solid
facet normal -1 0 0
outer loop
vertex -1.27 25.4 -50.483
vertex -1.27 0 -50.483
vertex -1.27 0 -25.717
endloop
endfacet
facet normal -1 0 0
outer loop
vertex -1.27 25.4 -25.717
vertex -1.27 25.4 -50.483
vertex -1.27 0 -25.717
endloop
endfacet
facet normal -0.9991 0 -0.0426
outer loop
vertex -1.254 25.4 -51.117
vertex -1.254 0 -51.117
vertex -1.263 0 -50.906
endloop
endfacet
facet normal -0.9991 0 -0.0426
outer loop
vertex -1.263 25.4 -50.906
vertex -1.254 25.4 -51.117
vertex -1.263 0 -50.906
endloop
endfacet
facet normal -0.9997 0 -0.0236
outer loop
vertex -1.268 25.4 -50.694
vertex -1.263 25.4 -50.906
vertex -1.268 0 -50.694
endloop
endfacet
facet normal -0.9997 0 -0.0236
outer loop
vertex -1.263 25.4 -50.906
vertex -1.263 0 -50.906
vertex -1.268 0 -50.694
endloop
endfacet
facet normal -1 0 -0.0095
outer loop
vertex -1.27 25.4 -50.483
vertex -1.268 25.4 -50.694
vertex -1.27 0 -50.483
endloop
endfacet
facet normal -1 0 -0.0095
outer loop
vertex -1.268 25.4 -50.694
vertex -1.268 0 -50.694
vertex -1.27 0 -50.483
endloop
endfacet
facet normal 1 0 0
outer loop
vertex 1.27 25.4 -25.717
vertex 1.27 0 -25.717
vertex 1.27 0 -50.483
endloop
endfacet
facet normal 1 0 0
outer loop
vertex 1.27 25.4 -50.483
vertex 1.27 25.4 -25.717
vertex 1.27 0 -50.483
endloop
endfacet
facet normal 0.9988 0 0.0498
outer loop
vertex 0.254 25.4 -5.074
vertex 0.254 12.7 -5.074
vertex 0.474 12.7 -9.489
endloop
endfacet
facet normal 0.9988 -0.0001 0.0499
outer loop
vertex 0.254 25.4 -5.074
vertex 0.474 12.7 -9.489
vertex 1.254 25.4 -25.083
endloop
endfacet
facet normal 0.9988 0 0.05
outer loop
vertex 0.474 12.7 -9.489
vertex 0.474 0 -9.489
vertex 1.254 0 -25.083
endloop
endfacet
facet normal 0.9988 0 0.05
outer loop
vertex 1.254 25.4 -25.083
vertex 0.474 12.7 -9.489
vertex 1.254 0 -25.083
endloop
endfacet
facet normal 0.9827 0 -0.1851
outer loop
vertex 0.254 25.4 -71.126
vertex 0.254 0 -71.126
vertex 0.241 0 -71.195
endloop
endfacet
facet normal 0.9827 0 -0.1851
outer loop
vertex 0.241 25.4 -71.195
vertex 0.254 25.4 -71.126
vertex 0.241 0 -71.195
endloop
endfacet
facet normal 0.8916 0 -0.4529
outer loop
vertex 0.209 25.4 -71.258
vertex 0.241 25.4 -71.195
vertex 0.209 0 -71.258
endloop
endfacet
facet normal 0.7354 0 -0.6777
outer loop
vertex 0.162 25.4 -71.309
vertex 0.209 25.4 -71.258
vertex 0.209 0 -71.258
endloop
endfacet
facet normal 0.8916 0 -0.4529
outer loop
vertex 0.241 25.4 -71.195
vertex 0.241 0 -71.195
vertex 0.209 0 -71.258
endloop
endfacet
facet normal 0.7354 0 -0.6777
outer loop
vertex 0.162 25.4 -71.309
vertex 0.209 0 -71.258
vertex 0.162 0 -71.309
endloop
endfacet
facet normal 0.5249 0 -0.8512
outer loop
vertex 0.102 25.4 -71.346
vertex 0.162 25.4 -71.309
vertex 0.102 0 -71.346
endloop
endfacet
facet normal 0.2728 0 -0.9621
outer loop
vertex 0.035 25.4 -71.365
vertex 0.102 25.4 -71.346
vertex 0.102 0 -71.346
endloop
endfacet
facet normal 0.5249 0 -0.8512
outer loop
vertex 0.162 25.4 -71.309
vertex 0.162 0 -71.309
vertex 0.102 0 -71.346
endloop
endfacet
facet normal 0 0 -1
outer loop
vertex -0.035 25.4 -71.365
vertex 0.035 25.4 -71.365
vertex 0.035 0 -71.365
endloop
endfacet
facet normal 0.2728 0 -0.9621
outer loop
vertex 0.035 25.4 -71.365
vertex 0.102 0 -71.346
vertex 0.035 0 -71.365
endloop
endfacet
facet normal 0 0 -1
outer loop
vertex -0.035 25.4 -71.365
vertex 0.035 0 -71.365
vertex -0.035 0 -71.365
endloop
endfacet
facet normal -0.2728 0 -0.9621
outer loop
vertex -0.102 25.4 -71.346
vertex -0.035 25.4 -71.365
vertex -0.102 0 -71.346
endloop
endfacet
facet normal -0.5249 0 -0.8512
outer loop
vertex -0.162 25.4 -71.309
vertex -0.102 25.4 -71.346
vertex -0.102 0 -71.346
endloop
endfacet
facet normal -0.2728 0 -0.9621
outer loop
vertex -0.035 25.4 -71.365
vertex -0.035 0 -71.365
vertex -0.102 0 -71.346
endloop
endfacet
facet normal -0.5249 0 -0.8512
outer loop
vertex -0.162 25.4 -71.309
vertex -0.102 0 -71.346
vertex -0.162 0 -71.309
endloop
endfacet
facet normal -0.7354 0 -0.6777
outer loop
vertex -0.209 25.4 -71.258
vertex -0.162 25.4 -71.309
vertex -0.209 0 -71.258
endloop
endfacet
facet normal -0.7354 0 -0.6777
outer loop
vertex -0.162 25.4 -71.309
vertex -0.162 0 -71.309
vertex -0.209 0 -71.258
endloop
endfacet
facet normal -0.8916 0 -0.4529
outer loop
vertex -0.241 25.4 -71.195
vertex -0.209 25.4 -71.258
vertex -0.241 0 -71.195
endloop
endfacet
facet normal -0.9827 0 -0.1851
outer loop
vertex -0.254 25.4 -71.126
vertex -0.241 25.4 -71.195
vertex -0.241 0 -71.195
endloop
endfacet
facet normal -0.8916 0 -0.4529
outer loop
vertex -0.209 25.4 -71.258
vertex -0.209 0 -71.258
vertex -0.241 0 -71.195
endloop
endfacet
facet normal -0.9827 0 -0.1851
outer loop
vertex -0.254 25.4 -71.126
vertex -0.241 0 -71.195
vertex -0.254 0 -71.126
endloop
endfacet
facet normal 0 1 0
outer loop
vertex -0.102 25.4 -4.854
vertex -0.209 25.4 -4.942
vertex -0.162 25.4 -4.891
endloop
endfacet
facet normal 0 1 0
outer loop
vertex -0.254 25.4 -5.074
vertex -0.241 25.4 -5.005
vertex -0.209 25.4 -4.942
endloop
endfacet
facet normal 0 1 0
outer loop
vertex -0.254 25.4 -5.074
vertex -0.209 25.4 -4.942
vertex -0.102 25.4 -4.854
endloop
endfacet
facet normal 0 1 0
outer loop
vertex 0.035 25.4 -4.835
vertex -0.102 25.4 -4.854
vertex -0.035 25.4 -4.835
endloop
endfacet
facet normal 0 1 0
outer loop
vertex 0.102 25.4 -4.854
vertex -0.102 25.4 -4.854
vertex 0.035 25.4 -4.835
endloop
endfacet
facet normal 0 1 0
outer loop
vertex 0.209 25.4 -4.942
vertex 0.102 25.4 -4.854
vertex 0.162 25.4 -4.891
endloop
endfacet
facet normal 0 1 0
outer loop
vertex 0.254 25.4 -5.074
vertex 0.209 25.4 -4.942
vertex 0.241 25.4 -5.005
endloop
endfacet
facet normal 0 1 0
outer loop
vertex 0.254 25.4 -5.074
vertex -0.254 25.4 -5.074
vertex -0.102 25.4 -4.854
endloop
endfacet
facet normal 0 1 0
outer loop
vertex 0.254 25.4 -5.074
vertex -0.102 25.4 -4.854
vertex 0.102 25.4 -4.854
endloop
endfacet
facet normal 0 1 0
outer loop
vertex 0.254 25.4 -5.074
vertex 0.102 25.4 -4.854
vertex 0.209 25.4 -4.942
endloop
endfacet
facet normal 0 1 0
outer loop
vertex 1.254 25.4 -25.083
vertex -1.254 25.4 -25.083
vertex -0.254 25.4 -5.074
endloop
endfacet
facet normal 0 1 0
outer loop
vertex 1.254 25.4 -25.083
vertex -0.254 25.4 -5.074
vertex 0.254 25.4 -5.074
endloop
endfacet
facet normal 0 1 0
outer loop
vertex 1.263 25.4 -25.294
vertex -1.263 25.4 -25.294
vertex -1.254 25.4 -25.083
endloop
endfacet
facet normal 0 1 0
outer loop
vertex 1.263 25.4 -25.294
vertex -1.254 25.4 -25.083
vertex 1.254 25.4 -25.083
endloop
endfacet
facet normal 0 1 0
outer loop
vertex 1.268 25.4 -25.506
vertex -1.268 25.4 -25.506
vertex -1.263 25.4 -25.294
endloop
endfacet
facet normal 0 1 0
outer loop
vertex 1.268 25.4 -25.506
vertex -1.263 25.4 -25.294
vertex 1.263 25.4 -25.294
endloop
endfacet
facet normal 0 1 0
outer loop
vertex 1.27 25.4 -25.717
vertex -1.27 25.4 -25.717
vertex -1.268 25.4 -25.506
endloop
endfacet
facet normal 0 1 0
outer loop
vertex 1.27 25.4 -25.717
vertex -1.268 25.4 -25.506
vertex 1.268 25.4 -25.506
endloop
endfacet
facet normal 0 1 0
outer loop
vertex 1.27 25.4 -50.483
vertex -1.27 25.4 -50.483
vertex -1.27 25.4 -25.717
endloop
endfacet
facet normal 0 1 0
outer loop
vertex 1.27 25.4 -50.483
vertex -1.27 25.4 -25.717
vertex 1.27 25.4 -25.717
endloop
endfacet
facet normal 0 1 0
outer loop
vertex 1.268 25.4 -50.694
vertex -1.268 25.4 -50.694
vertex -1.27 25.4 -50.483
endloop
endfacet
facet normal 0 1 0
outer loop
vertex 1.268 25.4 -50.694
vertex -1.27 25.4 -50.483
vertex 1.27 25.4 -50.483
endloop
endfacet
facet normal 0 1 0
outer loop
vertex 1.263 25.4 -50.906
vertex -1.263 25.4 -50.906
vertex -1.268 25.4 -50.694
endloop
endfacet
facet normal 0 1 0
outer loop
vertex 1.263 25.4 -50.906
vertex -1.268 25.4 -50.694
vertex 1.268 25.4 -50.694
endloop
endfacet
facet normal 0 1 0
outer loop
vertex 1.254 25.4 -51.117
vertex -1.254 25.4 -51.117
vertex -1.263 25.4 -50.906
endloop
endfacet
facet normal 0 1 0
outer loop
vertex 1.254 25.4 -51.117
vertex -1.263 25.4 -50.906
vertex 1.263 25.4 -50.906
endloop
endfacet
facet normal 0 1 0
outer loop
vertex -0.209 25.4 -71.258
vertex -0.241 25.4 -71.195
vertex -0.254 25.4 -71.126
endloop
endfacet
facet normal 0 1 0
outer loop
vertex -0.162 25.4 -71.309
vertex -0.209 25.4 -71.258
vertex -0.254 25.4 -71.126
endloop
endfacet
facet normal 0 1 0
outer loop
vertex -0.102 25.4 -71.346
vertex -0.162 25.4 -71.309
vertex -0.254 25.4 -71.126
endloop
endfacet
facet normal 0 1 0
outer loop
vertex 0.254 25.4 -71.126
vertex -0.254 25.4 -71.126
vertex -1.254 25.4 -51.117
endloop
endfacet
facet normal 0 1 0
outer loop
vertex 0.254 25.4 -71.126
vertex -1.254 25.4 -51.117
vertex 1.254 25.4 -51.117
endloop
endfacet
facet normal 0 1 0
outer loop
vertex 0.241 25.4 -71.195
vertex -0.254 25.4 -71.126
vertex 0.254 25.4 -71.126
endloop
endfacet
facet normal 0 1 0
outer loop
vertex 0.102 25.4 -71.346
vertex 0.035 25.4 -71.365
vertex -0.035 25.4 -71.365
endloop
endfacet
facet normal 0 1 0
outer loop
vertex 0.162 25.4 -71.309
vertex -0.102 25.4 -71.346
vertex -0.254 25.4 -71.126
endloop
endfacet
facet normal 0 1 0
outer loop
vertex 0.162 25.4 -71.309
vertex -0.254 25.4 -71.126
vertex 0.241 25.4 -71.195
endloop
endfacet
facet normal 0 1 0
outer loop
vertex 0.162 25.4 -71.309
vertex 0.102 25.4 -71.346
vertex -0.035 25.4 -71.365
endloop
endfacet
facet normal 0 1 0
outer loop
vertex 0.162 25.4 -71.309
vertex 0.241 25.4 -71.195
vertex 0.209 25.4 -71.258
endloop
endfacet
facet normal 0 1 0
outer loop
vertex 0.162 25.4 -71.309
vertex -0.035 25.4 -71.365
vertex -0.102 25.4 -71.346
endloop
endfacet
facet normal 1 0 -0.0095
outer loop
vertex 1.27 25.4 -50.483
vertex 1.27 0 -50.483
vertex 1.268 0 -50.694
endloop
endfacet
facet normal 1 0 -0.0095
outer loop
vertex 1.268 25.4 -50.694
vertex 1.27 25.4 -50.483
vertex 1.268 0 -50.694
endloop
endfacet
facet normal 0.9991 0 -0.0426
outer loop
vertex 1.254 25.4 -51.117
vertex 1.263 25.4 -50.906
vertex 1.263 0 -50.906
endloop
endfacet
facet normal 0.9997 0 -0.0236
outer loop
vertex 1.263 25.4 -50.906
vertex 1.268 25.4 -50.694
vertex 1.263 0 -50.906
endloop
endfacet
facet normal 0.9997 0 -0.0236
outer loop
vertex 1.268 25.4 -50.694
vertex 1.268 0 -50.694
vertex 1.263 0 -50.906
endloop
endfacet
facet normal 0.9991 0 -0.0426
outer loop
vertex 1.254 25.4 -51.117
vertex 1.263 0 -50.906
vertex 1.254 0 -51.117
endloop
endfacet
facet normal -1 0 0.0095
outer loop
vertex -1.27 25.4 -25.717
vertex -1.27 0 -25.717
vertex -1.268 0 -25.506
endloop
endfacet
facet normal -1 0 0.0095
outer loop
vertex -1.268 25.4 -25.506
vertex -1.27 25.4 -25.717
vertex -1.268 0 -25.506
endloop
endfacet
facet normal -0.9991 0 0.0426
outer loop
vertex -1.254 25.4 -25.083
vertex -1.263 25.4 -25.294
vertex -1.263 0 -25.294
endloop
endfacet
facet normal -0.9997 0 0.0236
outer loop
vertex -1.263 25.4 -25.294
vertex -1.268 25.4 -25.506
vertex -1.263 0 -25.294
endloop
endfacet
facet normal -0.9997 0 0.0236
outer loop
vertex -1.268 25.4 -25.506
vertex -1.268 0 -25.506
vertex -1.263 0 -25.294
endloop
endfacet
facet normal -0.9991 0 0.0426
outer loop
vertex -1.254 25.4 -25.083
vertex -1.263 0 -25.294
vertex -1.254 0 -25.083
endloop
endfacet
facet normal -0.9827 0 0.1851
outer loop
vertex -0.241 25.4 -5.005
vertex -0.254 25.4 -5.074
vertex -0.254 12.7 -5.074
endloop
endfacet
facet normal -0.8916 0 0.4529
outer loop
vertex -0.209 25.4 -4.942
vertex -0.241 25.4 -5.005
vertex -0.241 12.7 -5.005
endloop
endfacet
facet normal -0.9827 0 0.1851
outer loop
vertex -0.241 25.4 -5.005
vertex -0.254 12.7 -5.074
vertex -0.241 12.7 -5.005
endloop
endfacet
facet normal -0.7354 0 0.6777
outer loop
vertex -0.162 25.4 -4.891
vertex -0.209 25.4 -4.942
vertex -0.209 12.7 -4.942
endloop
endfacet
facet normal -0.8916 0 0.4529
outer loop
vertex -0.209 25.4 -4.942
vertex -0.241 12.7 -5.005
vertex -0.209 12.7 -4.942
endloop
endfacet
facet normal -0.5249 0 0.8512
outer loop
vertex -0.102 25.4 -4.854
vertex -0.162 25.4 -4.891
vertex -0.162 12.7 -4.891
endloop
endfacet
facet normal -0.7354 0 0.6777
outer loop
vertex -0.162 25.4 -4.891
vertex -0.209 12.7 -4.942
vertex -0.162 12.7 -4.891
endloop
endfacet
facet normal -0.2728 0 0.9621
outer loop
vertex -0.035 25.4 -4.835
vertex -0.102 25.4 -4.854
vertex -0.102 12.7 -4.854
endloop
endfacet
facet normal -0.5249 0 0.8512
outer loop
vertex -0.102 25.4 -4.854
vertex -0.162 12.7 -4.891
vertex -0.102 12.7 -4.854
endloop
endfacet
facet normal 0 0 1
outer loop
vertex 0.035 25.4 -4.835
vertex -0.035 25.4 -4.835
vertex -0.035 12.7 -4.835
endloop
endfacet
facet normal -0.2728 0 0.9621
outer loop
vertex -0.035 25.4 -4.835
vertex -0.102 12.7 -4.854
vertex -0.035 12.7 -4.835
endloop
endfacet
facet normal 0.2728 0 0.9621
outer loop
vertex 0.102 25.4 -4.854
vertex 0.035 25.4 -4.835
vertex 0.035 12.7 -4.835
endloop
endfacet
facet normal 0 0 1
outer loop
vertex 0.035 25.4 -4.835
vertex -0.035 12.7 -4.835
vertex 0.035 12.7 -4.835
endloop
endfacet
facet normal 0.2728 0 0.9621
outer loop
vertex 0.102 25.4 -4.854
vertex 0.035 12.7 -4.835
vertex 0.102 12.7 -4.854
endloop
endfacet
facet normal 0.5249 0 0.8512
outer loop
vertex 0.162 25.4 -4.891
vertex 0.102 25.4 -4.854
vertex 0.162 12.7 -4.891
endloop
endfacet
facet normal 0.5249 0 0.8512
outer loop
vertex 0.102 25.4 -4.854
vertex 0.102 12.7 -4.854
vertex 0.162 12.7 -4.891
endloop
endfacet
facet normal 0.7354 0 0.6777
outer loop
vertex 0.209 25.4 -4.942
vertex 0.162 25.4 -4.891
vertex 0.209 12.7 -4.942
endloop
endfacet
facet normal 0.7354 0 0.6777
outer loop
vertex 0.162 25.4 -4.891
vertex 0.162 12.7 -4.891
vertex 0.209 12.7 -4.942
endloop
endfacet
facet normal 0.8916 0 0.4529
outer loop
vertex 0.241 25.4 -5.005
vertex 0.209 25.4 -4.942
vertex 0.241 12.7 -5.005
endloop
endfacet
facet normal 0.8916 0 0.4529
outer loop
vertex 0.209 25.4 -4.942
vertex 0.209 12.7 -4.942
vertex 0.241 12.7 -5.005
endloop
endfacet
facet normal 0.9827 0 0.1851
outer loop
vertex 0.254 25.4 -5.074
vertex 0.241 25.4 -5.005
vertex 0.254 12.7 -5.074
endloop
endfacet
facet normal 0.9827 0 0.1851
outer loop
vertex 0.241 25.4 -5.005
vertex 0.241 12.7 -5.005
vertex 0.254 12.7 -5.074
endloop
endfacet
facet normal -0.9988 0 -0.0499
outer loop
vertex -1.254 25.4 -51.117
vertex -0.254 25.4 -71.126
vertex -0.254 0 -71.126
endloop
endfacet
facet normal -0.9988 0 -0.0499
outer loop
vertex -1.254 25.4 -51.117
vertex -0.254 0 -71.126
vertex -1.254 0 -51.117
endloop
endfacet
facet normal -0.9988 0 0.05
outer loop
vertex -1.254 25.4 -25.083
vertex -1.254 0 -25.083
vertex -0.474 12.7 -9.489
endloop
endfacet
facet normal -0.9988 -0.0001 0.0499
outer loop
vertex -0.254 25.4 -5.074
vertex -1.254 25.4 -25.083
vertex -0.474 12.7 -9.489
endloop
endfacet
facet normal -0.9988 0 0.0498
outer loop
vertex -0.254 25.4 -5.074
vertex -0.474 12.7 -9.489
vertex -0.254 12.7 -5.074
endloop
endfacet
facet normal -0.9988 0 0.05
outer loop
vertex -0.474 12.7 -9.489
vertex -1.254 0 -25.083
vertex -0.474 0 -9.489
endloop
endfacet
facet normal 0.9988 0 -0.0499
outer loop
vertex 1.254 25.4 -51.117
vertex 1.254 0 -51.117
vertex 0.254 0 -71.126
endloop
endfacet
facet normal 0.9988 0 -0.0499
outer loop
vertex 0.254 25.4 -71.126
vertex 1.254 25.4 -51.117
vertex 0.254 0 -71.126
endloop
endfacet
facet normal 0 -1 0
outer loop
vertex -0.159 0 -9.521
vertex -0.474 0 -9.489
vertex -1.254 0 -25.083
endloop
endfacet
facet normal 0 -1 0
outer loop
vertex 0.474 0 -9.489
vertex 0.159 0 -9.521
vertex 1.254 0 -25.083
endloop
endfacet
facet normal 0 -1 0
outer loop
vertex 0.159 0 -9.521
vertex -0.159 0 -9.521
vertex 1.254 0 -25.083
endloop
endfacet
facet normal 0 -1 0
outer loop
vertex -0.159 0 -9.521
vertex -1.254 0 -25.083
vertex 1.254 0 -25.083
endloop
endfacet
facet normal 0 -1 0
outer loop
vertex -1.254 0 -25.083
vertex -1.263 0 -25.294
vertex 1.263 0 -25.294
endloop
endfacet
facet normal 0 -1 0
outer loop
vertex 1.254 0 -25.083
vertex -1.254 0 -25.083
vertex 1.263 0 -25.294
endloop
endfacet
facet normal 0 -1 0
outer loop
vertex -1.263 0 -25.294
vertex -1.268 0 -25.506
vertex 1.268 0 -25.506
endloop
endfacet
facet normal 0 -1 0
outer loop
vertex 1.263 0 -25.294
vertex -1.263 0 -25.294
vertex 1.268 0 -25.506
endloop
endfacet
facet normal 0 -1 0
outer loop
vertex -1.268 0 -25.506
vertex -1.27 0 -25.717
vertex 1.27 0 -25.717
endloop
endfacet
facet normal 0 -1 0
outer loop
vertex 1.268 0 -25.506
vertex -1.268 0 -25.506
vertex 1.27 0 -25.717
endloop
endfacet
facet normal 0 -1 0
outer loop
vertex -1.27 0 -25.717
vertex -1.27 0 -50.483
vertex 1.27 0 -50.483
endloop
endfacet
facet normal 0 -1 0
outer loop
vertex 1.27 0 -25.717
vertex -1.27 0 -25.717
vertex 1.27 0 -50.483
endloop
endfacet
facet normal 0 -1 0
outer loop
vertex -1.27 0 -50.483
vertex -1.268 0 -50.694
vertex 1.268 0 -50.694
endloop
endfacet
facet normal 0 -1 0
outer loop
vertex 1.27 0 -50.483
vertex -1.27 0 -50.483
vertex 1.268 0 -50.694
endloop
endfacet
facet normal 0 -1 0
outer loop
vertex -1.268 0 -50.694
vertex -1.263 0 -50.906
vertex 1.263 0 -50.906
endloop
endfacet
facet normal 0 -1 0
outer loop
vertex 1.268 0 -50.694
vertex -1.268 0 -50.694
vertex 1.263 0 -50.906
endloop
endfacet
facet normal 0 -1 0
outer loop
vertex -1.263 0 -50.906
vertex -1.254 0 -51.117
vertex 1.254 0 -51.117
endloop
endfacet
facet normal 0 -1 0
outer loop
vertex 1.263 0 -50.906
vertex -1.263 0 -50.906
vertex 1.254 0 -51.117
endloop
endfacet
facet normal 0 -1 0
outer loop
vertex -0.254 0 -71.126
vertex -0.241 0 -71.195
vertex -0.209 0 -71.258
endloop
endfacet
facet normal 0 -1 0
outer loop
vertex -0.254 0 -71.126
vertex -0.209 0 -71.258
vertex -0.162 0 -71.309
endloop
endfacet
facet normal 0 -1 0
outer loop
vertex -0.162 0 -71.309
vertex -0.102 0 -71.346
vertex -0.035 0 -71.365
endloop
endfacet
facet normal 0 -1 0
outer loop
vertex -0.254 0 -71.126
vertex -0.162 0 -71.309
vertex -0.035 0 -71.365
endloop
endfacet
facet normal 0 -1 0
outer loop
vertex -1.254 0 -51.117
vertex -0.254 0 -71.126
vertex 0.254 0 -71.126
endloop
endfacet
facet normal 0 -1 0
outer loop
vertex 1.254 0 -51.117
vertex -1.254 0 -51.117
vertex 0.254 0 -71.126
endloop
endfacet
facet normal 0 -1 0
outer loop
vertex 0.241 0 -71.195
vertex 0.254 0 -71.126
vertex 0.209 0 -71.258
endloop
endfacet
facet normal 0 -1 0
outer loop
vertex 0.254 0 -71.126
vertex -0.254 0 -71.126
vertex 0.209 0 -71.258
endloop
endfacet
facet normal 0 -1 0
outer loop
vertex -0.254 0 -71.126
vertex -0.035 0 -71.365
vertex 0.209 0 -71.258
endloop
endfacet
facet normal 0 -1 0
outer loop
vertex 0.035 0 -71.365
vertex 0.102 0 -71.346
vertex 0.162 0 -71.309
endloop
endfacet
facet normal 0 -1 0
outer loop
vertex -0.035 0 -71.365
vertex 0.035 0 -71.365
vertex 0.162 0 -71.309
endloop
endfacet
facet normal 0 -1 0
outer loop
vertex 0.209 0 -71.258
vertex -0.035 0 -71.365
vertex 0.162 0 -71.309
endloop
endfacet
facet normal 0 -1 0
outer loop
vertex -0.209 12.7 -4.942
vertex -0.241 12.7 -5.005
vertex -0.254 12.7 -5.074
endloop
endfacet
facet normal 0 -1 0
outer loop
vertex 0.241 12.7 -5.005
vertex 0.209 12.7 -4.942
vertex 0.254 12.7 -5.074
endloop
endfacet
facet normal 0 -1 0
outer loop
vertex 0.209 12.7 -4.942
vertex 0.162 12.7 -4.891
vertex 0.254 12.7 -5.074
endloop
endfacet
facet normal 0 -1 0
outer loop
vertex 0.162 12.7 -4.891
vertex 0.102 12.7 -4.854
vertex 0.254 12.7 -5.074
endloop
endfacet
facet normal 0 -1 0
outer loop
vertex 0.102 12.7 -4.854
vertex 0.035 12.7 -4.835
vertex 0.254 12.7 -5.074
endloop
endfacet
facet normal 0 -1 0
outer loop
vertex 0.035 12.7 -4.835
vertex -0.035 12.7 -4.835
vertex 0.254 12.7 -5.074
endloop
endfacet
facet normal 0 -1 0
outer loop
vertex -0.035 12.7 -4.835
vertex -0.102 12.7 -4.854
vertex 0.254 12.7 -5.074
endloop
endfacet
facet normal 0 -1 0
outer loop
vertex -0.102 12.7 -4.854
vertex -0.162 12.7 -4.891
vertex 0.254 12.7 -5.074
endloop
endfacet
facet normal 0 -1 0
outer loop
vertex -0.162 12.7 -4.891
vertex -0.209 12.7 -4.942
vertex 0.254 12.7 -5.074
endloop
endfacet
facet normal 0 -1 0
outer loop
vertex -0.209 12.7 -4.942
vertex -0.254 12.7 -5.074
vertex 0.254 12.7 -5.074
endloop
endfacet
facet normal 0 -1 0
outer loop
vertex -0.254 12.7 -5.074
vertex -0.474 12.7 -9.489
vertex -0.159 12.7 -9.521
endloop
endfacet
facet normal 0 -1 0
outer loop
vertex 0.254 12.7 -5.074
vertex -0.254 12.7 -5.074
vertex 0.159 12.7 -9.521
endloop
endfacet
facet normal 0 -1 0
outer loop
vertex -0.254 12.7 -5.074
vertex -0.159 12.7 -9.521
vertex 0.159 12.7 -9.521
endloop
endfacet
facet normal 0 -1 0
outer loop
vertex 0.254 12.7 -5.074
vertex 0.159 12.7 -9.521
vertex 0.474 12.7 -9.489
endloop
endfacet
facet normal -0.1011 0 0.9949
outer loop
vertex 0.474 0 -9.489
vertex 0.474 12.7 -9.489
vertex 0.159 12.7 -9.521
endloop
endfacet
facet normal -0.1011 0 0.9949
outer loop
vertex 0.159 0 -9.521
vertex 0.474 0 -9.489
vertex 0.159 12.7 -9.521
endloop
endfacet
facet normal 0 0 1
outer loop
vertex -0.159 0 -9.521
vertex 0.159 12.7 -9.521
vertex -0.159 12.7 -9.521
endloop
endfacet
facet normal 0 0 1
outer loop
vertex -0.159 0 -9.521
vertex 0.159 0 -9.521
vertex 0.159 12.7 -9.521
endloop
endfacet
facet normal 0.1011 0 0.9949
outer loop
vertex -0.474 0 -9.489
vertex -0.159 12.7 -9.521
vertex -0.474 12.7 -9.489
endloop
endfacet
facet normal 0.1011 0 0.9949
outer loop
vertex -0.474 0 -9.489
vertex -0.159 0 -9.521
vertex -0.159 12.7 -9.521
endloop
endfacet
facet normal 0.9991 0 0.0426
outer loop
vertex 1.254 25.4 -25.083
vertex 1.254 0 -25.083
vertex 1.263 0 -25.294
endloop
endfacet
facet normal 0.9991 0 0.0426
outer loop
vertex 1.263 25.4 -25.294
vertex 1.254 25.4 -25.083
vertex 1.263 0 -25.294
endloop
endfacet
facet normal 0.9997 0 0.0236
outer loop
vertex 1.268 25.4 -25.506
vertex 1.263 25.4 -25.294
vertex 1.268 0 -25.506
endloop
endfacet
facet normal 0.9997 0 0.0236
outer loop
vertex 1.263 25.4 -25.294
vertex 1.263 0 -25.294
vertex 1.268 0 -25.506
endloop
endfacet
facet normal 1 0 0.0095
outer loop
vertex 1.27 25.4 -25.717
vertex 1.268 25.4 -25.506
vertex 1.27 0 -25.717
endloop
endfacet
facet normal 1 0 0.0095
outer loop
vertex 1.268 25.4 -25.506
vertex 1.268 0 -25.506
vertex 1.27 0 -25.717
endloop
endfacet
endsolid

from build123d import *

# Parameters (mm, degrees)
BOSS_EXTRUDE1_DEPTH = 25.4
FILLET1_R           = 12.7
SKETCH4_R           = 3.175
CUT_EXTRUDE2_DEPTH  = 12.7


with BuildPart() as part:
    # Sketch1 → Boss-Extrude1 (new body)
    with BuildSketch(Plane(origin=(0, 0, 0), x_dir=(1, 0, 0), z_dir=(0, 1, 0))):
        with BuildLine():
            Line((-1.27, 50.8), (-1.27, 25.4))
            Line((-1.27, 25.4), (-0.253683094, 5.073661881))
            ThreePointArc((-0.253683094, 5.073661881), (0, 4.832346036), (0.253683094, 5.073661881))
            Line((0.253683094, 5.073661881), (1.27, 25.4))
            Line((1.27, 25.4), (1.27, 50.8))
            Line((1.27, 50.8), (0.253683094, 71.126338119))
            ThreePointArc((0.253683094, 71.126338119), (0, 71.367653964), (-0.253683094, 71.126338119))
            Line((-0.253683094, 71.126338119), (-1.27, 50.8))
        make_face()
    extrude(amount=BOSS_EXTRUDE1_DEPTH)

    # Fillet1
    # the kernel refuses this fillet: 12.7 mm, written as the material it takes off along each edge
    with BuildSketch(Plane(origin=(-1.27, -0.793254525, -25.4), x_dir=(0, 0, -1), z_dir=(0, 1, 0)), Plane(origin=(-1.27, -0.793254525, -50.8), x_dir=(0.04993761694389363, 0, -0.9987523388778445), z_dir=(0, 1, 0)), Plane(origin=(1.27, -0.793254525, -50.8), x_dir=(0, 0, 1), z_dir=(0, 1, 0)), Plane(origin=(1.27, -0.793254525, -25.4), x_dir=(-0.04993761694389503, 0, 0.9987523388778445), z_dir=(0, 1, 0))) as fillet1_piece_1:
        with BuildLine():
            CenterArc((FILLET1_R * 0.0249843945008, -FILLET1_R), FILLET1_R, 90, 2.862405226)
            Line((-FILLET1_R * 0.0249532224431, -FILLET1_R * 0.00124766112216), (0, 0))
            Line((0, 0), (FILLET1_R * 0.0249843945008, 0))
        make_face()
    extrude(amount=26.986509051, mode=Mode.SUBTRACT)

    # Sketch4 → Cut-Extrude2 (cut)
    with BuildSketch(Plane(origin=(0, 0, 0), x_dir=(1, 0, 0), z_dir=(0, 1, 0))):
        with Locations((0, 6.35)):
            Circle(SKETCH4_R)
    extrude(amount=CUT_EXTRUDE2_DEPTH, mode=Mode.SUBTRACT)


solid = part.part
